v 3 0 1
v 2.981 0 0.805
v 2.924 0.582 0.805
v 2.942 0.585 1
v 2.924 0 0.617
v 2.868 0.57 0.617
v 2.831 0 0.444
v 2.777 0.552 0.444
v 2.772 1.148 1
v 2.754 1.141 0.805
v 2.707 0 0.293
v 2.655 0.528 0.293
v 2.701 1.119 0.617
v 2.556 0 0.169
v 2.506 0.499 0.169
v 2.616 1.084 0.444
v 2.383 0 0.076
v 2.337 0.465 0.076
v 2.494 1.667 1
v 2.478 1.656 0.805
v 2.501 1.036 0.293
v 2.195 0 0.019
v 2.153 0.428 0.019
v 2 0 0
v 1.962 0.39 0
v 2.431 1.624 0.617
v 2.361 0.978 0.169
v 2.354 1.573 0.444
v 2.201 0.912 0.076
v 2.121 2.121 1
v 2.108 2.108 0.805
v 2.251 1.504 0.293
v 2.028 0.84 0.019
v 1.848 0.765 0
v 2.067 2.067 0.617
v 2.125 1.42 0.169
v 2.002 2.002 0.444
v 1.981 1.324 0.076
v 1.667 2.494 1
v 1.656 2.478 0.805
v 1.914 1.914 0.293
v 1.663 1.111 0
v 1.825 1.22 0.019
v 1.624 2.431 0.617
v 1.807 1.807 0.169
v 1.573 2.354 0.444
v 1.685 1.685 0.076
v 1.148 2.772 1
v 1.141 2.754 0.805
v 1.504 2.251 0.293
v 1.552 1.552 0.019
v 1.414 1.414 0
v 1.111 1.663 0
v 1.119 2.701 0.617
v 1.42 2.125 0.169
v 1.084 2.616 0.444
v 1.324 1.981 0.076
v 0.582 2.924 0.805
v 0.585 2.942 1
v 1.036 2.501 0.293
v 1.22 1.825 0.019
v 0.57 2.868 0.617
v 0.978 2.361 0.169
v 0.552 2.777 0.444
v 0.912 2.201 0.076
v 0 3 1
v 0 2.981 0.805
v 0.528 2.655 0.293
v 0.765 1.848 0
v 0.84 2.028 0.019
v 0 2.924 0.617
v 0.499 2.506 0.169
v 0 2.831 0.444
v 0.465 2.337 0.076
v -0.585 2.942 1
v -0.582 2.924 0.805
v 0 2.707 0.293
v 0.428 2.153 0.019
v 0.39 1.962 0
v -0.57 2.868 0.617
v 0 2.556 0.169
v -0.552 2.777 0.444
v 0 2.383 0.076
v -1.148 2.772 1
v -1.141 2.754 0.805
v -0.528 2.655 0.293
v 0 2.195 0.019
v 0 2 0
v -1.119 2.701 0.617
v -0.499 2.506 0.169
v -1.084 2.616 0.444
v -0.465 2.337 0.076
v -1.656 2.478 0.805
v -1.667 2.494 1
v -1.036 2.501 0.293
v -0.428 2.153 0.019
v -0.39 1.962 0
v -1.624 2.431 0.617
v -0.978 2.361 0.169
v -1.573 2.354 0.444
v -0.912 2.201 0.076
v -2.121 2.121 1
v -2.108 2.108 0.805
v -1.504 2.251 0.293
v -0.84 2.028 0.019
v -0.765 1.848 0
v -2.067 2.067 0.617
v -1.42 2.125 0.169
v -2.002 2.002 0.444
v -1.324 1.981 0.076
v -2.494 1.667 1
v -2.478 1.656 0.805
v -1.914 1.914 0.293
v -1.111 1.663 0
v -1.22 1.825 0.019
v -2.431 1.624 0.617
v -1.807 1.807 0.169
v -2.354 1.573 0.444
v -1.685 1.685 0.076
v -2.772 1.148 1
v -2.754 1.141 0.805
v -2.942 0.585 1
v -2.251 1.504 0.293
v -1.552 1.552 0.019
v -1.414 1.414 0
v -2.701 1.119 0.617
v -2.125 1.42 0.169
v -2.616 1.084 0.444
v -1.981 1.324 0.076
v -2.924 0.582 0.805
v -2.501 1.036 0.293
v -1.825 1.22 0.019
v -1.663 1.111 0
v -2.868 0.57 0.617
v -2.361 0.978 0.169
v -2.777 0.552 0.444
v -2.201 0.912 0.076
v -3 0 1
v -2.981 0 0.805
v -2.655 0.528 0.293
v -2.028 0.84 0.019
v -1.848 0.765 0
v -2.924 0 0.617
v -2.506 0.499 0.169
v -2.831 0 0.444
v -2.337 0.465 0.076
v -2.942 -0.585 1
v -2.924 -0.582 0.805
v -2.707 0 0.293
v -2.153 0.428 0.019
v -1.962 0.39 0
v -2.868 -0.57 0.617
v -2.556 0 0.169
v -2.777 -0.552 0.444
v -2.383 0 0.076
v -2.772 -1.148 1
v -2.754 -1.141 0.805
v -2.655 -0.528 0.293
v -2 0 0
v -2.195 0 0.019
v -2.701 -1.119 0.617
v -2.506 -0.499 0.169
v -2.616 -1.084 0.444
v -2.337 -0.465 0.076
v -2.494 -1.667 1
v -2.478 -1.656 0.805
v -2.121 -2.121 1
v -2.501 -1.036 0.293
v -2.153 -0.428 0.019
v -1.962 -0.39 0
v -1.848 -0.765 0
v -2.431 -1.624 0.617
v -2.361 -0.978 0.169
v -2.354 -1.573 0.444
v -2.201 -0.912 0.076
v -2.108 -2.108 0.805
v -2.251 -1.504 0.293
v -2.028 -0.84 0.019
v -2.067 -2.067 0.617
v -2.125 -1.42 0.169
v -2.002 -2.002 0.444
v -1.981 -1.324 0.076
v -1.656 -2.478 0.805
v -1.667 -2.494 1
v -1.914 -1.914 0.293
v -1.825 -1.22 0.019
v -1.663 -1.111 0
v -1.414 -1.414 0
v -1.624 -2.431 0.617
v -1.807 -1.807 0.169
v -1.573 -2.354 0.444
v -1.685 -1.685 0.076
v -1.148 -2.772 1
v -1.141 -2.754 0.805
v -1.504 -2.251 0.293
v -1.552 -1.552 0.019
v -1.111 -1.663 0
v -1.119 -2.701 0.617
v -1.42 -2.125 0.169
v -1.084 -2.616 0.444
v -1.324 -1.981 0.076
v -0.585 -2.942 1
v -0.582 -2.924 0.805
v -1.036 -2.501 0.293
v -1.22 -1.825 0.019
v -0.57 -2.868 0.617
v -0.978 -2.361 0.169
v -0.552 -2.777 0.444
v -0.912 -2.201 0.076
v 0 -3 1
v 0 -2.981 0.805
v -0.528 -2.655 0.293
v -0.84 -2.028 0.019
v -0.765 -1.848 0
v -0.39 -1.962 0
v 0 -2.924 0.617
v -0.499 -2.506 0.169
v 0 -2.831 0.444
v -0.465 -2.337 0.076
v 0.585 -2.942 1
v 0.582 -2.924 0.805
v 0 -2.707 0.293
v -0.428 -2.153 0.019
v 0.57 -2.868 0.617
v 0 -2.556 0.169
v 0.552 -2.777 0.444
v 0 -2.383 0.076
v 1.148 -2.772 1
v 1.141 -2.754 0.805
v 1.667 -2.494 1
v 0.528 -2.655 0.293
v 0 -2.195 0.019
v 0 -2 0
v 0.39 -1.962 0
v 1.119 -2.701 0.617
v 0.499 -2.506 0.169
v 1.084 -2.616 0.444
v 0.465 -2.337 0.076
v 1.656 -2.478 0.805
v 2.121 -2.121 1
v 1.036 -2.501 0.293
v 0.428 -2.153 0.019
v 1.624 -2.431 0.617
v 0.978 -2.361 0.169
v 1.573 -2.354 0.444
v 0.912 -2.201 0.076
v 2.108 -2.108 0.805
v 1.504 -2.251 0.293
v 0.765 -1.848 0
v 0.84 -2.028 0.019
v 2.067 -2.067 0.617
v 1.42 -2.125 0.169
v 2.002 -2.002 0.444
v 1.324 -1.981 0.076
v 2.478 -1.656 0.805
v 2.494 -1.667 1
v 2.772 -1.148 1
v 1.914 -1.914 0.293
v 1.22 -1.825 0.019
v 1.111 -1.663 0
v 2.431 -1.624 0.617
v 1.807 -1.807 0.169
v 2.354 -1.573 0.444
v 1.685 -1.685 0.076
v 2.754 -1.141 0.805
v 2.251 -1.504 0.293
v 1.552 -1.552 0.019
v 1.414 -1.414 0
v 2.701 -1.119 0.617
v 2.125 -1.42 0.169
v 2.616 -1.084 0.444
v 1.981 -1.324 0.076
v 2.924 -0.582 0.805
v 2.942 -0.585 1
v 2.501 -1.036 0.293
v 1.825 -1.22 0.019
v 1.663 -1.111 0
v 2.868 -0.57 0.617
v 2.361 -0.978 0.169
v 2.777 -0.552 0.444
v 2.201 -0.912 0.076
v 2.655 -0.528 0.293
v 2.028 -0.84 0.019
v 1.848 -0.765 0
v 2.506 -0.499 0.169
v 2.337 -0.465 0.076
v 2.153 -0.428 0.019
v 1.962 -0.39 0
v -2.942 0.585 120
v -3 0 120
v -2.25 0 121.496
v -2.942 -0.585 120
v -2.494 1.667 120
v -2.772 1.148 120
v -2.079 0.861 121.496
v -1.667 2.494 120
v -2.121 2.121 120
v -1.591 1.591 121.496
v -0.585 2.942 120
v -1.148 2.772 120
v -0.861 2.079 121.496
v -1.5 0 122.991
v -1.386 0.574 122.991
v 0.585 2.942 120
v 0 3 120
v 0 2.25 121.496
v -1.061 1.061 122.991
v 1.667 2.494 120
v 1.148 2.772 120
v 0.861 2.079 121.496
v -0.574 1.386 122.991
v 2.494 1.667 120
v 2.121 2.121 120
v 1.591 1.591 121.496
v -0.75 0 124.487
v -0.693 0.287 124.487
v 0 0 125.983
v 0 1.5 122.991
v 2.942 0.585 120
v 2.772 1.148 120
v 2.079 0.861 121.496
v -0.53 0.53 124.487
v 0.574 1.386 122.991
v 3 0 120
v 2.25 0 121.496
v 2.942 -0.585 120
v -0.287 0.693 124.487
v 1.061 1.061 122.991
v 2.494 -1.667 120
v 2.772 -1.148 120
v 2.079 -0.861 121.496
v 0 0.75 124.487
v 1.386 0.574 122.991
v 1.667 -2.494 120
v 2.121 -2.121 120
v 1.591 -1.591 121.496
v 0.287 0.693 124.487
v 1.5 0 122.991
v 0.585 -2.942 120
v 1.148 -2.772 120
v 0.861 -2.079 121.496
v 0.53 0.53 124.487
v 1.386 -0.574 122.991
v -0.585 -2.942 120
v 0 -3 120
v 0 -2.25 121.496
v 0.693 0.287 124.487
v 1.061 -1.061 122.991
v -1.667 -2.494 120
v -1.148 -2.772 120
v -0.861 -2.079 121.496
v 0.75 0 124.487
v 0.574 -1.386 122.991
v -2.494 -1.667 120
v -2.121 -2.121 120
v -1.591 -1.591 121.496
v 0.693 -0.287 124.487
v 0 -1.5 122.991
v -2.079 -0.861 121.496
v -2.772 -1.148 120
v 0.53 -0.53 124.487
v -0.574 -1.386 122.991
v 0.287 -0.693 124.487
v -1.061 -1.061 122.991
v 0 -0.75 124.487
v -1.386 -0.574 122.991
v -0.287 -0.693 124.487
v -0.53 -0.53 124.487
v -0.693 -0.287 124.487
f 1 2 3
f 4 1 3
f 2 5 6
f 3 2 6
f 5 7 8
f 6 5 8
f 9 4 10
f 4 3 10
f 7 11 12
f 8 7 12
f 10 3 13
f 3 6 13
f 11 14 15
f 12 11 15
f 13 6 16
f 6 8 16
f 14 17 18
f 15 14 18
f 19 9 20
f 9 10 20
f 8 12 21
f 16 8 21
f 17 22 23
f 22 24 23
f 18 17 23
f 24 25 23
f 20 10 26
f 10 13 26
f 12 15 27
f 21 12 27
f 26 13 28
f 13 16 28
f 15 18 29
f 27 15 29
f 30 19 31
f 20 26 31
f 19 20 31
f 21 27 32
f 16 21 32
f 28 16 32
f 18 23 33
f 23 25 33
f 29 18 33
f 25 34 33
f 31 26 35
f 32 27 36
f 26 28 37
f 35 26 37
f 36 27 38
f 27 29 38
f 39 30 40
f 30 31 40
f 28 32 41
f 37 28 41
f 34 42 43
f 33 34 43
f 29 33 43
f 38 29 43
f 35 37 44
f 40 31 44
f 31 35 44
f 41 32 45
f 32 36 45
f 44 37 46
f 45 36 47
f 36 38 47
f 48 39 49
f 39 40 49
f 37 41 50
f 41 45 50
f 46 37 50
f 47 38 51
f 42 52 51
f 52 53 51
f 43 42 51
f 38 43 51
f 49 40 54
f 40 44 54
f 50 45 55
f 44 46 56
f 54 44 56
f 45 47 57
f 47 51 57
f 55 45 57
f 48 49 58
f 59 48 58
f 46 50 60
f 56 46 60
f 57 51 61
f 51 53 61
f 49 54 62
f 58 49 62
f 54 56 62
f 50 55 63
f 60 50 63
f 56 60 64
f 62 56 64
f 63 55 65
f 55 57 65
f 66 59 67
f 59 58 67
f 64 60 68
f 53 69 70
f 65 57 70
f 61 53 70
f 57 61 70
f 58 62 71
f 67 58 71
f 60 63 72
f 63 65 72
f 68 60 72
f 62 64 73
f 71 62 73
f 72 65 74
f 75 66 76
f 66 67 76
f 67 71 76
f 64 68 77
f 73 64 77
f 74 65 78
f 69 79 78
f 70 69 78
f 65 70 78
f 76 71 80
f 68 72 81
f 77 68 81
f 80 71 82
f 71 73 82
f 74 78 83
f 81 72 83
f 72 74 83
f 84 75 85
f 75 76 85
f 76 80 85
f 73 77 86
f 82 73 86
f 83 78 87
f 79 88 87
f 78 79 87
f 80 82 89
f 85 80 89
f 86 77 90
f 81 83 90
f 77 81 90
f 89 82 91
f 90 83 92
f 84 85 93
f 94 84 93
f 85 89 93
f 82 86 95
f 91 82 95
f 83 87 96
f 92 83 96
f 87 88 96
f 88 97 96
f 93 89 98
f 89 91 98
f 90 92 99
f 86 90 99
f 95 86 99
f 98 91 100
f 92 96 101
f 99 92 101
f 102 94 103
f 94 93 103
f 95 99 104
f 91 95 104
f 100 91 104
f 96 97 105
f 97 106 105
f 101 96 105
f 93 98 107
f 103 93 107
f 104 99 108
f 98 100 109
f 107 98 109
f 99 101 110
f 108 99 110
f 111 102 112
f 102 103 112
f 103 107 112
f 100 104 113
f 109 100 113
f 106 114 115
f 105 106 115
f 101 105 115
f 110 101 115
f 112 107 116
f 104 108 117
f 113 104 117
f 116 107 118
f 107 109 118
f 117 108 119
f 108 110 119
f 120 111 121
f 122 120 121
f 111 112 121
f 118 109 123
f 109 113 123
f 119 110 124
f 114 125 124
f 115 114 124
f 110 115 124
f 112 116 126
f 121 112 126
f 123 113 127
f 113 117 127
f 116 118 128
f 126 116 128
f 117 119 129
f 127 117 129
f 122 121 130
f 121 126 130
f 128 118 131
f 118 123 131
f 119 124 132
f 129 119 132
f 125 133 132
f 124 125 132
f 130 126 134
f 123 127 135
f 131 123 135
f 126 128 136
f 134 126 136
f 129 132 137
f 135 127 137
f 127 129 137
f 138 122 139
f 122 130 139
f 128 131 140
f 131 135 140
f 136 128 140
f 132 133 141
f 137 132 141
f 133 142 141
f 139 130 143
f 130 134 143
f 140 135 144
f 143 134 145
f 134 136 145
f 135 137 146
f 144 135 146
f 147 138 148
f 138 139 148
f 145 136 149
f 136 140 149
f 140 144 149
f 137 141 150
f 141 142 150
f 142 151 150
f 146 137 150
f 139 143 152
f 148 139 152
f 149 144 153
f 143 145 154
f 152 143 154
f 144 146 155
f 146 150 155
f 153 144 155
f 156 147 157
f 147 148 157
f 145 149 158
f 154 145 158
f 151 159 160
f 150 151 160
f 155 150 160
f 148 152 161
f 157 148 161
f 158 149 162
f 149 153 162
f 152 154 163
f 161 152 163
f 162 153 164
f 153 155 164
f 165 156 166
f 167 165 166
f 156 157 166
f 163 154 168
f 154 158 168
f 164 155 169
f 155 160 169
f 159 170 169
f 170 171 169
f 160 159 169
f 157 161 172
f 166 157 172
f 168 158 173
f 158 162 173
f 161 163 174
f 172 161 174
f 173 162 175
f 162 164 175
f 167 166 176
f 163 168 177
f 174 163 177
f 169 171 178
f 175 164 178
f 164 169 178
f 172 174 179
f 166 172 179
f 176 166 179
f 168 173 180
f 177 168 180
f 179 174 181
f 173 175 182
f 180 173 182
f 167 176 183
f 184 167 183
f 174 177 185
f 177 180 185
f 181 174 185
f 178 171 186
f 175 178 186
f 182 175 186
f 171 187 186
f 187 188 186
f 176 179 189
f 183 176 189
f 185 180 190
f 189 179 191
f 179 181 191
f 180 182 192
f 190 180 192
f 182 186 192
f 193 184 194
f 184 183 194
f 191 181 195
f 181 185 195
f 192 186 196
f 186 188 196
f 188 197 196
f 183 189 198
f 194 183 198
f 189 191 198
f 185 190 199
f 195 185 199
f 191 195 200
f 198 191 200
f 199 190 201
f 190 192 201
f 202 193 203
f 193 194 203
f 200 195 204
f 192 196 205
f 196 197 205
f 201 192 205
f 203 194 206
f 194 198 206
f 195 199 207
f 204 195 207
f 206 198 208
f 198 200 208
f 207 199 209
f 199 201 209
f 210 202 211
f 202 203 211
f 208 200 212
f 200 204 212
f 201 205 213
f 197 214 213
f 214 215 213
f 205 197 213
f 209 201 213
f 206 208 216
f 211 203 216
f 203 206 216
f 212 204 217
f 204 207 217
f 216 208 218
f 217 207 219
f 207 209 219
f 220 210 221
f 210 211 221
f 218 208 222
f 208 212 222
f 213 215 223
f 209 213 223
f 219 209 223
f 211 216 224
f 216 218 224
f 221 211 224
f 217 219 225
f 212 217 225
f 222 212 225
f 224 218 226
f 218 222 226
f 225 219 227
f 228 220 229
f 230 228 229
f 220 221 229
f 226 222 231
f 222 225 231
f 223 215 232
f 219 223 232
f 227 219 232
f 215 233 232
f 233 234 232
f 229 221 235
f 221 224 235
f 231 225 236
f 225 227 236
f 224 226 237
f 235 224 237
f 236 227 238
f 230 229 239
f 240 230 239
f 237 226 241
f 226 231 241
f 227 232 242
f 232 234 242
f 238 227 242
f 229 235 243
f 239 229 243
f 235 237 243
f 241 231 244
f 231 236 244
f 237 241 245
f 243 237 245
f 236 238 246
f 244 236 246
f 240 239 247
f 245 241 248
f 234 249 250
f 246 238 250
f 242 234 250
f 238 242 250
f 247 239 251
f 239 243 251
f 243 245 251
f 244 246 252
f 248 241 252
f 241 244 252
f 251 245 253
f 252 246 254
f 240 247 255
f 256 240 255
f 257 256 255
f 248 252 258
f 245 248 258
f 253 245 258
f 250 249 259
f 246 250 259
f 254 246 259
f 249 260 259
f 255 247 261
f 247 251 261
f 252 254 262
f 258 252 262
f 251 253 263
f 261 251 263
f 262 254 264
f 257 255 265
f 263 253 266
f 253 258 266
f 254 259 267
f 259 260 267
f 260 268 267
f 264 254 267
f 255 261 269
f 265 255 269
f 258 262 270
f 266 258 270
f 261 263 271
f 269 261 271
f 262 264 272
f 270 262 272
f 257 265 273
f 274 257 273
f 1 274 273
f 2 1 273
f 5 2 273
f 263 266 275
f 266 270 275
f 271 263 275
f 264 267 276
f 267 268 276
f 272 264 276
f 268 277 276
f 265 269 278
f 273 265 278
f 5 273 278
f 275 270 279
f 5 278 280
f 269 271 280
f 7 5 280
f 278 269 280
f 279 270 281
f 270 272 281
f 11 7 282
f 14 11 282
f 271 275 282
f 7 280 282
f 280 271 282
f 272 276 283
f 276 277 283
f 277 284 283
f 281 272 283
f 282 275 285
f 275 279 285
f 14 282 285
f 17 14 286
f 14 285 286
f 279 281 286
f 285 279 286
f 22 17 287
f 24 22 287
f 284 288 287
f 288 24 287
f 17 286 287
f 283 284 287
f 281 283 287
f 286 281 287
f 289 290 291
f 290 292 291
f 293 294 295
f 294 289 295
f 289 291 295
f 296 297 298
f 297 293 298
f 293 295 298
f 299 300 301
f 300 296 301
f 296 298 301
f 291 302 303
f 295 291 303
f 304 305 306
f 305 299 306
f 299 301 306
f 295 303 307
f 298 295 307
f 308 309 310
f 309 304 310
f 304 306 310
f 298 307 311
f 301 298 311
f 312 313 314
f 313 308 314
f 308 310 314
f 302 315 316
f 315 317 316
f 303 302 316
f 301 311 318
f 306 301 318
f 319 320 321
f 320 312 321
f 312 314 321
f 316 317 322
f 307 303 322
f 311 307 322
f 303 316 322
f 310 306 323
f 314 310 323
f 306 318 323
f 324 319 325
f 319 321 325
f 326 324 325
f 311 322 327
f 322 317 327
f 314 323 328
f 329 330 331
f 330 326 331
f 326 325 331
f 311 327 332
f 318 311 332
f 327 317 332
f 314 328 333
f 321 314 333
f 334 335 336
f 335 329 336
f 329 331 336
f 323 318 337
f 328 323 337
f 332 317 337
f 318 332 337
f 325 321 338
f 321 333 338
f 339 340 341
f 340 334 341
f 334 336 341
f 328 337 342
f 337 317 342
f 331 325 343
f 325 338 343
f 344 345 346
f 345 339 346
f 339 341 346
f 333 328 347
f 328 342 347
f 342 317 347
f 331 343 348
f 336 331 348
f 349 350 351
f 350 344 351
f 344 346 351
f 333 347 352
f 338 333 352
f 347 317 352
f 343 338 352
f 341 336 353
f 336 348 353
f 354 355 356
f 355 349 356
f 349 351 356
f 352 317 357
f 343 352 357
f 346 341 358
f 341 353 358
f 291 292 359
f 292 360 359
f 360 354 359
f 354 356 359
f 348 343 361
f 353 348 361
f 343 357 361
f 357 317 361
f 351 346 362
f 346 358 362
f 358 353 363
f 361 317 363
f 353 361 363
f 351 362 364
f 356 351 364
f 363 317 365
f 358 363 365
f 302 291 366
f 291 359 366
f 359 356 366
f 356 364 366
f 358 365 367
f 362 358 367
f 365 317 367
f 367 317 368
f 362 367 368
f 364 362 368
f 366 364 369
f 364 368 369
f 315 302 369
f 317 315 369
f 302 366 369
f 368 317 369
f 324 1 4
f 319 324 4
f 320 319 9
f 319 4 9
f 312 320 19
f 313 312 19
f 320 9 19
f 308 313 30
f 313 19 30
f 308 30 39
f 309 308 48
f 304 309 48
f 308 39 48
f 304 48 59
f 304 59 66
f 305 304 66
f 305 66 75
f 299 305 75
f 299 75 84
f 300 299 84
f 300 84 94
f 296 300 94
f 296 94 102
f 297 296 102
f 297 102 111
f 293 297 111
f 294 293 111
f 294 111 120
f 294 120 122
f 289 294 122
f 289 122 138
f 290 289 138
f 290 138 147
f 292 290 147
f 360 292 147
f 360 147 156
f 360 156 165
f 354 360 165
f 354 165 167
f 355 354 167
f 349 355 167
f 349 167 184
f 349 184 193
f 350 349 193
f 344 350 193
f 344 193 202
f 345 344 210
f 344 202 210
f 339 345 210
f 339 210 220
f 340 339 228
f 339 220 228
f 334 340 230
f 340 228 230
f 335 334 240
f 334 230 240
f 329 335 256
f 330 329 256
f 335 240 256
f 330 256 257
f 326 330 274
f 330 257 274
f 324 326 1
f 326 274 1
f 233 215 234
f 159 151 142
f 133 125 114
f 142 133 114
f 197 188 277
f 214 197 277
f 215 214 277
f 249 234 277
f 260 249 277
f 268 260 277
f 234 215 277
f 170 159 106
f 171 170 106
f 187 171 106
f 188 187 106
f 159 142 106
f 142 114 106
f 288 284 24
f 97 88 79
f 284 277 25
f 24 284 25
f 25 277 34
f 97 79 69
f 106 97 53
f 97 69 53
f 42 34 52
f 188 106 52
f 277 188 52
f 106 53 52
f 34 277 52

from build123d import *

# Parameters (mm, degrees)
SKETCH1_R           = 3
BOSS_EXTRUDE1_DEPTH = 120
FILLET1_R           = 1


with BuildPart() as part:
    # Sketch1 → Boss-Extrude1 (new body)
    with BuildSketch(Plane.XY):
        Circle(SKETCH1_R)
    extrude(amount=BOSS_EXTRUDE1_DEPTH)

    # Sketch4 → Revolve2 (revolve)
    with BuildSketch(Plane(origin=(0, 0, 0), x_dir=(1, 0, 0), z_dir=(0, 1, 0)), mode=Mode.PRIVATE) as revolve2_sk:
        Polygon((3, -120), (0, -125.982943807), (0, -120), align=None)
    revolve(revolve2_sk.sketch.rotate(Axis((0, 0, 147.90647938), (0, 0, -1)), 180), axis=Axis((0, 0, 147.90647938), (0, 0, -1)))

    # Fillet1
    fillet1_edges = [part.edges().sort_by_distance(p)[0] for p in [
        (-3, 0, 0),
    ]]
    fillet(fillet1_edges, radius=FILLET1_R)


solid = part.part
